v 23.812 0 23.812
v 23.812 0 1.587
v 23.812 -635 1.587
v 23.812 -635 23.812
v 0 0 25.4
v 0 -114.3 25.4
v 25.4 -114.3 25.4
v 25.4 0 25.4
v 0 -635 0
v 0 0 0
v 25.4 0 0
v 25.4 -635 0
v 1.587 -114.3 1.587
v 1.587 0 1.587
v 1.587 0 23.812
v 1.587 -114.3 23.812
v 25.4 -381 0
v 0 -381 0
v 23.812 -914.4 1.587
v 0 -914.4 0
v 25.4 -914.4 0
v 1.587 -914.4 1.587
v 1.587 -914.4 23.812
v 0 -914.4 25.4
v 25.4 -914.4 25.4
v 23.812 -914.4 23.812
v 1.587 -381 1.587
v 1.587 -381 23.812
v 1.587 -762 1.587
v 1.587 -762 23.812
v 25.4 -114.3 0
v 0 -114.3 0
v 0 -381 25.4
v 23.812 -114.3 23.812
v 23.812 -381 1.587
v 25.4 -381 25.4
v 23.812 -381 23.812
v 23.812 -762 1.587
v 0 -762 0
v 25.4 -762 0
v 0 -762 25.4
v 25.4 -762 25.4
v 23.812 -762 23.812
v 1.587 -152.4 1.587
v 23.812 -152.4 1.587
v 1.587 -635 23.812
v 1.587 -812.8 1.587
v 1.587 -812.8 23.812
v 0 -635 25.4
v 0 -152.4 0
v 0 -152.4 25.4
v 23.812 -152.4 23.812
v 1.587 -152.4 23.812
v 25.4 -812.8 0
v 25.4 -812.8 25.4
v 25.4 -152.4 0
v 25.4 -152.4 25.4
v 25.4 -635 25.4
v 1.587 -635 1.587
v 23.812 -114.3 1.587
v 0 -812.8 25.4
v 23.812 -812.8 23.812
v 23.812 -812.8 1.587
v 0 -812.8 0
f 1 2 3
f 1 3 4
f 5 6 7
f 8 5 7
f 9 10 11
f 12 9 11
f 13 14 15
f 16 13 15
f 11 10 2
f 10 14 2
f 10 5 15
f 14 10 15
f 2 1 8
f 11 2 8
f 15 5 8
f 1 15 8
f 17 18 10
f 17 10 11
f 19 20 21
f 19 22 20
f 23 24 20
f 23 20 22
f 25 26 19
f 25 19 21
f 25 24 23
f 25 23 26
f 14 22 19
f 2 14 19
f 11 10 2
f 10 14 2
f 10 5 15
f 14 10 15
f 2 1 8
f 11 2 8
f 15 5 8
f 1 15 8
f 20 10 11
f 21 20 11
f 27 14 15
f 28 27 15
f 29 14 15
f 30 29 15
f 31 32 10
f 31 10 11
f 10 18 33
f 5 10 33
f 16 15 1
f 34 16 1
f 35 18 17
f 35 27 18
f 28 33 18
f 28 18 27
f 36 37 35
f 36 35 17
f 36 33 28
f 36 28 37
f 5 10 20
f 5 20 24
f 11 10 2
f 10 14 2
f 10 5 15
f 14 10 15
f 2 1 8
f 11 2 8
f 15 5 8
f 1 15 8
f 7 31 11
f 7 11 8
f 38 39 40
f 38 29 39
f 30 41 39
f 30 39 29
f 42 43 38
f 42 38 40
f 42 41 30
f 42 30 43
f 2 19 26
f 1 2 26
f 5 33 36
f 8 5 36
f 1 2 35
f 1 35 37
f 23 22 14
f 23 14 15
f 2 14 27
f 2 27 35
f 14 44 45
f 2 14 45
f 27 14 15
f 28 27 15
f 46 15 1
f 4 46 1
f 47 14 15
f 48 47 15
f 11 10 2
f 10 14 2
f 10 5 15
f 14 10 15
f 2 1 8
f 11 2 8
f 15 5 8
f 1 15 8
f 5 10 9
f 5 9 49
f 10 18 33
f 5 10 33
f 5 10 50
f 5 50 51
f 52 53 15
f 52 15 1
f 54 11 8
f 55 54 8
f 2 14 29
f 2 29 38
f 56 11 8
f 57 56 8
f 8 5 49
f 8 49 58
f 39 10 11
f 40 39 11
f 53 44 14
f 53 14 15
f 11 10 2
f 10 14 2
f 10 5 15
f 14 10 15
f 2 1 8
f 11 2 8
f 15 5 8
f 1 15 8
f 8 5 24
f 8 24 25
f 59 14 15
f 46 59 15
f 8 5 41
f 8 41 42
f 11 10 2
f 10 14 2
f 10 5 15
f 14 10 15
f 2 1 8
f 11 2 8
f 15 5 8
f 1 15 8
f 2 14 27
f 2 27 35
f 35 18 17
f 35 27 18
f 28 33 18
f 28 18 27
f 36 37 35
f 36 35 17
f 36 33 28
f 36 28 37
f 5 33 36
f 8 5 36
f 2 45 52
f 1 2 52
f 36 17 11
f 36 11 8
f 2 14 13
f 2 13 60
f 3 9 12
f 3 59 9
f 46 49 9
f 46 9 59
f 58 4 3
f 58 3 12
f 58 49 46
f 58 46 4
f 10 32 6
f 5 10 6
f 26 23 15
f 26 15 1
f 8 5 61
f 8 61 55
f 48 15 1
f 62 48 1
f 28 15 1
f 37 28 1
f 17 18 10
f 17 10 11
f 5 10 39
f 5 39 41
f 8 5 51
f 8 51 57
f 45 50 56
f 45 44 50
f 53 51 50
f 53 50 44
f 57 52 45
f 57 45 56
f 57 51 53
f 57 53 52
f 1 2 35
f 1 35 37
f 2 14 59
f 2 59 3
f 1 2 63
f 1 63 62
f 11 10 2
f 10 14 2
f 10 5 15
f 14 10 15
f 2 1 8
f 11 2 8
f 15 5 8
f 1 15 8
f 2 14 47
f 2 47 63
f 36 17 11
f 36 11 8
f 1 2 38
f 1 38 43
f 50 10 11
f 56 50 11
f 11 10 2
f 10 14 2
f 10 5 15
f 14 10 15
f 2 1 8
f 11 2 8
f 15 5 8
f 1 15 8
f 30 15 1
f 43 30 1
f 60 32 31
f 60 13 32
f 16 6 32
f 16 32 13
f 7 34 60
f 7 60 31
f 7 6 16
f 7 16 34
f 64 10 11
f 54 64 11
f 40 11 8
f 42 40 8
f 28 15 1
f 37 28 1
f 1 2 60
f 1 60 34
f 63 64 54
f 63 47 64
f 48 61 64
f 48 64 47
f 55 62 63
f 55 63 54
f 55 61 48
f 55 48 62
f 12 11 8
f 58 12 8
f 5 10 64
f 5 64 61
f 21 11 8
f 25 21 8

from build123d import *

# Parameters (mm, degrees)
F0_W     = 25.4
F0_H     = 25.4
F0_W_2   = 22.225
F0_H_2   = 22.225
F1_DEPTH = 914.4
F2_DEPTH = 152.4
F3_DEPTH = 381
F4_DEPTH = 381
F5_DEPTH = 635
F6_DEPTH = 812.8
F7_DEPTH = 114.3
F8_DEPTH = 762


with BuildPart() as f1:
    # F0 (on Front) → F1 (new body)
    with BuildSketch(Plane.XZ):
        with Locations((12.7, 12.7)):
            Rectangle(F0_W, F0_H)
        with Locations((12.7, 12.7)):
            Rectangle(F0_W_2, F0_H_2, mode=Mode.SUBTRACT)
    extrude(amount=F1_DEPTH)


with BuildPart() as f2:
    # F0 (on Front) → F2 (new body)
    with BuildSketch(Plane.XZ):
        with Locations((12.7, 12.7)):
            Rectangle(F0_W, F0_H)
        with Locations((12.7, 12.7)):
            Rectangle(F0_W_2, F0_H_2, mode=Mode.SUBTRACT)
    extrude(amount=F2_DEPTH)


with BuildPart() as f3:
    # F0 (on Front) → F3 (new body)
    with BuildSketch(Plane.XZ):
        with Locations((12.7, 12.7)):
            Rectangle(F0_W, F0_H)
        with Locations((12.7, 12.7)):
            Rectangle(F0_W_2, F0_H_2, mode=Mode.SUBTRACT)
    extrude(amount=F3_DEPTH)


with BuildPart() as f4:
    # F0 (on Front) → F4 (new body)
    with BuildSketch(Plane.XZ):
        with Locations((12.7, 12.7)):
            Rectangle(F0_W, F0_H)
        with Locations((12.7, 12.7)):
            Rectangle(F0_W_2, F0_H_2, mode=Mode.SUBTRACT)
    extrude(amount=F4_DEPTH)


with BuildPart() as f5:
    # F0 (on Front) → F5 (new body)
    with BuildSketch(Plane.XZ):
        with Locations((12.7, 12.7)):
            Rectangle(F0_W, F0_H)
        with Locations((12.7, 12.7)):
            Rectangle(F0_W_2, F0_H_2, mode=Mode.SUBTRACT)
    extrude(amount=F5_DEPTH)


with BuildPart() as f6:
    # F0 (on Front) → F6 (new body)
    with BuildSketch(Plane.XZ):
        with Locations((12.7, 12.7)):
            Rectangle(F0_W, F0_H)
        with Locations((12.7, 12.7)):
            Rectangle(F0_W_2, F0_H_2, mode=Mode.SUBTRACT)
    extrude(amount=F6_DEPTH)


with BuildPart() as f7:
    # F0 (on Front) → F7 (new body)
    with BuildSketch(Plane.XZ):
        with Locations((12.7, 12.7)):
            Rectangle(F0_W, F0_H)
        with Locations((12.7, 12.7)):
            Rectangle(F0_W_2, F0_H_2, mode=Mode.SUBTRACT)
    extrude(amount=F7_DEPTH)


with BuildPart() as f8:
    # F0 (on Front) → F8 (new body)
    with BuildSketch(Plane.XZ):
        with Locations((12.7, 12.7)):
            Rectangle(F0_W, F0_H)
        with Locations((12.7, 12.7)):
            Rectangle(F0_W_2, F0_H_2, mode=Mode.SUBTRACT)
    extrude(amount=F8_DEPTH)


solid = Compound([f1.part, f2.part, f3.part, f4.part, f5.part, f6.part, f7.part, f8.part])
